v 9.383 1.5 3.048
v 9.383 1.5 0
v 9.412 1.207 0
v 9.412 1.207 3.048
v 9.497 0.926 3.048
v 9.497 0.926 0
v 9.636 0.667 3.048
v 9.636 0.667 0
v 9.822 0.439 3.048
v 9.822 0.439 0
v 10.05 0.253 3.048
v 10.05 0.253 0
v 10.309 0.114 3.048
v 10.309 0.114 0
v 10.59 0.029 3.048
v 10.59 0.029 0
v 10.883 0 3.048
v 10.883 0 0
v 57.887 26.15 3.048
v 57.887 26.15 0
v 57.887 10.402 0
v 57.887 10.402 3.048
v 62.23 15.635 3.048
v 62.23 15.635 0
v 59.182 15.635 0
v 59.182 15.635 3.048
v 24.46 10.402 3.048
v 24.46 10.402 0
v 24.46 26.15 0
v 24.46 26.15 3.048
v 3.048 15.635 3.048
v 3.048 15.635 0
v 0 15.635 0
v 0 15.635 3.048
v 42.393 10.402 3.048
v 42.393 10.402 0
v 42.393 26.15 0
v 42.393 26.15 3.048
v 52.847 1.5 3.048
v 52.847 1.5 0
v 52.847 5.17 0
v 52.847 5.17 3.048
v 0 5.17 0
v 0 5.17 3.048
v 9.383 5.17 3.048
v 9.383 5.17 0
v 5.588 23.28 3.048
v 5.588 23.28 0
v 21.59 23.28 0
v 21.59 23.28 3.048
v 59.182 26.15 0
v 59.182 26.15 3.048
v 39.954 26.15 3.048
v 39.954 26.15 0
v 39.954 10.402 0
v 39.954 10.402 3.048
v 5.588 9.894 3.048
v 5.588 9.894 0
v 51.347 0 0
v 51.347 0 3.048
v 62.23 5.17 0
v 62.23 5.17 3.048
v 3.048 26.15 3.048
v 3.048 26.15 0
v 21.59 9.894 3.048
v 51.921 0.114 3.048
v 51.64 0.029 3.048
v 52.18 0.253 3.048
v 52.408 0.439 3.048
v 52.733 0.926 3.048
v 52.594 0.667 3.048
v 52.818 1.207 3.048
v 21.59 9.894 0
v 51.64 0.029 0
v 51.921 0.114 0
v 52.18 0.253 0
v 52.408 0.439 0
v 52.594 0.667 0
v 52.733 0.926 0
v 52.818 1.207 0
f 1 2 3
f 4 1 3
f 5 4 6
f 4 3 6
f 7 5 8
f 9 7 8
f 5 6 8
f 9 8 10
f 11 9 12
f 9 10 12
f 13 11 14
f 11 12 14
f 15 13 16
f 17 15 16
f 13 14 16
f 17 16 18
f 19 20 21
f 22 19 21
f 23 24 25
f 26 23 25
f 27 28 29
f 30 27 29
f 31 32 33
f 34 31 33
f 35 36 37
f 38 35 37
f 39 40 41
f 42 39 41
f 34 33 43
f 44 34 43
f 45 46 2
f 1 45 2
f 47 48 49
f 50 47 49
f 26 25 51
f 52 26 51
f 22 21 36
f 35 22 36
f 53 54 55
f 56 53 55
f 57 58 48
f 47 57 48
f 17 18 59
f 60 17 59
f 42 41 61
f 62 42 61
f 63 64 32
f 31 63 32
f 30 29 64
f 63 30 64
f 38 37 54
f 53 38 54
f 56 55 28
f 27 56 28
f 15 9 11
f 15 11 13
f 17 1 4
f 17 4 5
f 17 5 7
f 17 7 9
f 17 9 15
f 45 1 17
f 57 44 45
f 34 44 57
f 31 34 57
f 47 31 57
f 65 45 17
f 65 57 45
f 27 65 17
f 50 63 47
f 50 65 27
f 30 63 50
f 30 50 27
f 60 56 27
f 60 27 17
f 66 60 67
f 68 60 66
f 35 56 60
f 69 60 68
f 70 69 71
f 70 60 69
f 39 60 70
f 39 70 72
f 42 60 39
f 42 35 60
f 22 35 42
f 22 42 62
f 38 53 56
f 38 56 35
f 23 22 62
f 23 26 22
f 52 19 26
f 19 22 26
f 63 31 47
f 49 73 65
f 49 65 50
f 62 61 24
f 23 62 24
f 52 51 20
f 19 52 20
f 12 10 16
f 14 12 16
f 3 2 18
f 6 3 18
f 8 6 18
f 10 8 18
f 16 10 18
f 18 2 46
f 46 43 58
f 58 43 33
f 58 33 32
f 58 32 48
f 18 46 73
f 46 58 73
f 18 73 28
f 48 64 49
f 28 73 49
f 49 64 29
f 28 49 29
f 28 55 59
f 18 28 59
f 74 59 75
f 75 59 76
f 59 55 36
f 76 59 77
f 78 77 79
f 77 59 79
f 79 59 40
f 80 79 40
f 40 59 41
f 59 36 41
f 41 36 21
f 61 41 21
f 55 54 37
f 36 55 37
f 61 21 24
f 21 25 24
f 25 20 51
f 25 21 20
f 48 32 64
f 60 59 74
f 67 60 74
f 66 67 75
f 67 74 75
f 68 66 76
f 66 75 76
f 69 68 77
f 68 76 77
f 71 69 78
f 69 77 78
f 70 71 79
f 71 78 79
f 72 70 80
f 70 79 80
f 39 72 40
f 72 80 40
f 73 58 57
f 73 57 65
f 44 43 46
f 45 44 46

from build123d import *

# Parameters (mm, degrees)
MODEL_W             = 16.001999145
MODEL_H             = 13.385799247
BOSS_EXTRUDE1_DEPTH = 3.048


with BuildPart() as part:
    # Model → Boss-Extrude1 (new body)
    with BuildSketch(Plane.XY):
        with BuildLine():
            Line((3.047999926, 15.63479994), (0, 15.63479994))
            Line((0, 15.63479994), (0, 5.17))
            Line((0, 5.17), (9.382999755, 5.17))
            Line((9.382999755, 5.17), (9.382999755, 1.5))
            ThreePointArc((9.382999755, 1.5), (9.822339583, 0.439339828), (10.882999755, 0))
            Line((10.882999755, 0), (51.346999833, 0))
            ThreePointArc((51.346999833, 0), (52.407660005, 0.439339828), (52.846999833, 1.5))
            Line((52.846999833, 1.5), (52.846999833, 5.17))
            Line((52.846999833, 5.17), (62.229999341, 5.17))
            Line((62.229999341, 5.17), (62.229999341, 15.63479994))
            Line((62.229999341, 15.63479994), (59.182000346, 15.63479994))
            Line((59.182000346, 15.63479994), (59.182000346, 26.150399451))
            Line((59.182000346, 26.150399451), (57.886601426, 26.150399451))
            Line((57.886601426, 26.150399451), (57.886601426, 10.402400144))
            Line((57.886601426, 10.402400144), (42.392601259, 10.402400144))
            Line((42.392601259, 10.402400144), (42.392601259, 26.150399451))
            Line((42.392601259, 26.150399451), (39.954201318, 26.150399451))
            Line((39.954201318, 26.150399451), (39.954201318, 10.402400144))
            Line((39.954201318, 10.402400144), (24.460199289, 10.402400144))
            Line((24.460199289, 10.402400144), (24.460199289, 26.150399451))
            Line((24.460199289, 26.150399451), (3.047999926, 26.150399451))
            Line((3.047999926, 26.150399451), (3.047999926, 15.63479994))
        make_face()
        with Locations((13.588999515, 16.587299626)):
            Rectangle(MODEL_W, MODEL_H, mode=Mode.SUBTRACT)
    extrude(amount=BOSS_EXTRUDE1_DEPTH)


solid = part.part
